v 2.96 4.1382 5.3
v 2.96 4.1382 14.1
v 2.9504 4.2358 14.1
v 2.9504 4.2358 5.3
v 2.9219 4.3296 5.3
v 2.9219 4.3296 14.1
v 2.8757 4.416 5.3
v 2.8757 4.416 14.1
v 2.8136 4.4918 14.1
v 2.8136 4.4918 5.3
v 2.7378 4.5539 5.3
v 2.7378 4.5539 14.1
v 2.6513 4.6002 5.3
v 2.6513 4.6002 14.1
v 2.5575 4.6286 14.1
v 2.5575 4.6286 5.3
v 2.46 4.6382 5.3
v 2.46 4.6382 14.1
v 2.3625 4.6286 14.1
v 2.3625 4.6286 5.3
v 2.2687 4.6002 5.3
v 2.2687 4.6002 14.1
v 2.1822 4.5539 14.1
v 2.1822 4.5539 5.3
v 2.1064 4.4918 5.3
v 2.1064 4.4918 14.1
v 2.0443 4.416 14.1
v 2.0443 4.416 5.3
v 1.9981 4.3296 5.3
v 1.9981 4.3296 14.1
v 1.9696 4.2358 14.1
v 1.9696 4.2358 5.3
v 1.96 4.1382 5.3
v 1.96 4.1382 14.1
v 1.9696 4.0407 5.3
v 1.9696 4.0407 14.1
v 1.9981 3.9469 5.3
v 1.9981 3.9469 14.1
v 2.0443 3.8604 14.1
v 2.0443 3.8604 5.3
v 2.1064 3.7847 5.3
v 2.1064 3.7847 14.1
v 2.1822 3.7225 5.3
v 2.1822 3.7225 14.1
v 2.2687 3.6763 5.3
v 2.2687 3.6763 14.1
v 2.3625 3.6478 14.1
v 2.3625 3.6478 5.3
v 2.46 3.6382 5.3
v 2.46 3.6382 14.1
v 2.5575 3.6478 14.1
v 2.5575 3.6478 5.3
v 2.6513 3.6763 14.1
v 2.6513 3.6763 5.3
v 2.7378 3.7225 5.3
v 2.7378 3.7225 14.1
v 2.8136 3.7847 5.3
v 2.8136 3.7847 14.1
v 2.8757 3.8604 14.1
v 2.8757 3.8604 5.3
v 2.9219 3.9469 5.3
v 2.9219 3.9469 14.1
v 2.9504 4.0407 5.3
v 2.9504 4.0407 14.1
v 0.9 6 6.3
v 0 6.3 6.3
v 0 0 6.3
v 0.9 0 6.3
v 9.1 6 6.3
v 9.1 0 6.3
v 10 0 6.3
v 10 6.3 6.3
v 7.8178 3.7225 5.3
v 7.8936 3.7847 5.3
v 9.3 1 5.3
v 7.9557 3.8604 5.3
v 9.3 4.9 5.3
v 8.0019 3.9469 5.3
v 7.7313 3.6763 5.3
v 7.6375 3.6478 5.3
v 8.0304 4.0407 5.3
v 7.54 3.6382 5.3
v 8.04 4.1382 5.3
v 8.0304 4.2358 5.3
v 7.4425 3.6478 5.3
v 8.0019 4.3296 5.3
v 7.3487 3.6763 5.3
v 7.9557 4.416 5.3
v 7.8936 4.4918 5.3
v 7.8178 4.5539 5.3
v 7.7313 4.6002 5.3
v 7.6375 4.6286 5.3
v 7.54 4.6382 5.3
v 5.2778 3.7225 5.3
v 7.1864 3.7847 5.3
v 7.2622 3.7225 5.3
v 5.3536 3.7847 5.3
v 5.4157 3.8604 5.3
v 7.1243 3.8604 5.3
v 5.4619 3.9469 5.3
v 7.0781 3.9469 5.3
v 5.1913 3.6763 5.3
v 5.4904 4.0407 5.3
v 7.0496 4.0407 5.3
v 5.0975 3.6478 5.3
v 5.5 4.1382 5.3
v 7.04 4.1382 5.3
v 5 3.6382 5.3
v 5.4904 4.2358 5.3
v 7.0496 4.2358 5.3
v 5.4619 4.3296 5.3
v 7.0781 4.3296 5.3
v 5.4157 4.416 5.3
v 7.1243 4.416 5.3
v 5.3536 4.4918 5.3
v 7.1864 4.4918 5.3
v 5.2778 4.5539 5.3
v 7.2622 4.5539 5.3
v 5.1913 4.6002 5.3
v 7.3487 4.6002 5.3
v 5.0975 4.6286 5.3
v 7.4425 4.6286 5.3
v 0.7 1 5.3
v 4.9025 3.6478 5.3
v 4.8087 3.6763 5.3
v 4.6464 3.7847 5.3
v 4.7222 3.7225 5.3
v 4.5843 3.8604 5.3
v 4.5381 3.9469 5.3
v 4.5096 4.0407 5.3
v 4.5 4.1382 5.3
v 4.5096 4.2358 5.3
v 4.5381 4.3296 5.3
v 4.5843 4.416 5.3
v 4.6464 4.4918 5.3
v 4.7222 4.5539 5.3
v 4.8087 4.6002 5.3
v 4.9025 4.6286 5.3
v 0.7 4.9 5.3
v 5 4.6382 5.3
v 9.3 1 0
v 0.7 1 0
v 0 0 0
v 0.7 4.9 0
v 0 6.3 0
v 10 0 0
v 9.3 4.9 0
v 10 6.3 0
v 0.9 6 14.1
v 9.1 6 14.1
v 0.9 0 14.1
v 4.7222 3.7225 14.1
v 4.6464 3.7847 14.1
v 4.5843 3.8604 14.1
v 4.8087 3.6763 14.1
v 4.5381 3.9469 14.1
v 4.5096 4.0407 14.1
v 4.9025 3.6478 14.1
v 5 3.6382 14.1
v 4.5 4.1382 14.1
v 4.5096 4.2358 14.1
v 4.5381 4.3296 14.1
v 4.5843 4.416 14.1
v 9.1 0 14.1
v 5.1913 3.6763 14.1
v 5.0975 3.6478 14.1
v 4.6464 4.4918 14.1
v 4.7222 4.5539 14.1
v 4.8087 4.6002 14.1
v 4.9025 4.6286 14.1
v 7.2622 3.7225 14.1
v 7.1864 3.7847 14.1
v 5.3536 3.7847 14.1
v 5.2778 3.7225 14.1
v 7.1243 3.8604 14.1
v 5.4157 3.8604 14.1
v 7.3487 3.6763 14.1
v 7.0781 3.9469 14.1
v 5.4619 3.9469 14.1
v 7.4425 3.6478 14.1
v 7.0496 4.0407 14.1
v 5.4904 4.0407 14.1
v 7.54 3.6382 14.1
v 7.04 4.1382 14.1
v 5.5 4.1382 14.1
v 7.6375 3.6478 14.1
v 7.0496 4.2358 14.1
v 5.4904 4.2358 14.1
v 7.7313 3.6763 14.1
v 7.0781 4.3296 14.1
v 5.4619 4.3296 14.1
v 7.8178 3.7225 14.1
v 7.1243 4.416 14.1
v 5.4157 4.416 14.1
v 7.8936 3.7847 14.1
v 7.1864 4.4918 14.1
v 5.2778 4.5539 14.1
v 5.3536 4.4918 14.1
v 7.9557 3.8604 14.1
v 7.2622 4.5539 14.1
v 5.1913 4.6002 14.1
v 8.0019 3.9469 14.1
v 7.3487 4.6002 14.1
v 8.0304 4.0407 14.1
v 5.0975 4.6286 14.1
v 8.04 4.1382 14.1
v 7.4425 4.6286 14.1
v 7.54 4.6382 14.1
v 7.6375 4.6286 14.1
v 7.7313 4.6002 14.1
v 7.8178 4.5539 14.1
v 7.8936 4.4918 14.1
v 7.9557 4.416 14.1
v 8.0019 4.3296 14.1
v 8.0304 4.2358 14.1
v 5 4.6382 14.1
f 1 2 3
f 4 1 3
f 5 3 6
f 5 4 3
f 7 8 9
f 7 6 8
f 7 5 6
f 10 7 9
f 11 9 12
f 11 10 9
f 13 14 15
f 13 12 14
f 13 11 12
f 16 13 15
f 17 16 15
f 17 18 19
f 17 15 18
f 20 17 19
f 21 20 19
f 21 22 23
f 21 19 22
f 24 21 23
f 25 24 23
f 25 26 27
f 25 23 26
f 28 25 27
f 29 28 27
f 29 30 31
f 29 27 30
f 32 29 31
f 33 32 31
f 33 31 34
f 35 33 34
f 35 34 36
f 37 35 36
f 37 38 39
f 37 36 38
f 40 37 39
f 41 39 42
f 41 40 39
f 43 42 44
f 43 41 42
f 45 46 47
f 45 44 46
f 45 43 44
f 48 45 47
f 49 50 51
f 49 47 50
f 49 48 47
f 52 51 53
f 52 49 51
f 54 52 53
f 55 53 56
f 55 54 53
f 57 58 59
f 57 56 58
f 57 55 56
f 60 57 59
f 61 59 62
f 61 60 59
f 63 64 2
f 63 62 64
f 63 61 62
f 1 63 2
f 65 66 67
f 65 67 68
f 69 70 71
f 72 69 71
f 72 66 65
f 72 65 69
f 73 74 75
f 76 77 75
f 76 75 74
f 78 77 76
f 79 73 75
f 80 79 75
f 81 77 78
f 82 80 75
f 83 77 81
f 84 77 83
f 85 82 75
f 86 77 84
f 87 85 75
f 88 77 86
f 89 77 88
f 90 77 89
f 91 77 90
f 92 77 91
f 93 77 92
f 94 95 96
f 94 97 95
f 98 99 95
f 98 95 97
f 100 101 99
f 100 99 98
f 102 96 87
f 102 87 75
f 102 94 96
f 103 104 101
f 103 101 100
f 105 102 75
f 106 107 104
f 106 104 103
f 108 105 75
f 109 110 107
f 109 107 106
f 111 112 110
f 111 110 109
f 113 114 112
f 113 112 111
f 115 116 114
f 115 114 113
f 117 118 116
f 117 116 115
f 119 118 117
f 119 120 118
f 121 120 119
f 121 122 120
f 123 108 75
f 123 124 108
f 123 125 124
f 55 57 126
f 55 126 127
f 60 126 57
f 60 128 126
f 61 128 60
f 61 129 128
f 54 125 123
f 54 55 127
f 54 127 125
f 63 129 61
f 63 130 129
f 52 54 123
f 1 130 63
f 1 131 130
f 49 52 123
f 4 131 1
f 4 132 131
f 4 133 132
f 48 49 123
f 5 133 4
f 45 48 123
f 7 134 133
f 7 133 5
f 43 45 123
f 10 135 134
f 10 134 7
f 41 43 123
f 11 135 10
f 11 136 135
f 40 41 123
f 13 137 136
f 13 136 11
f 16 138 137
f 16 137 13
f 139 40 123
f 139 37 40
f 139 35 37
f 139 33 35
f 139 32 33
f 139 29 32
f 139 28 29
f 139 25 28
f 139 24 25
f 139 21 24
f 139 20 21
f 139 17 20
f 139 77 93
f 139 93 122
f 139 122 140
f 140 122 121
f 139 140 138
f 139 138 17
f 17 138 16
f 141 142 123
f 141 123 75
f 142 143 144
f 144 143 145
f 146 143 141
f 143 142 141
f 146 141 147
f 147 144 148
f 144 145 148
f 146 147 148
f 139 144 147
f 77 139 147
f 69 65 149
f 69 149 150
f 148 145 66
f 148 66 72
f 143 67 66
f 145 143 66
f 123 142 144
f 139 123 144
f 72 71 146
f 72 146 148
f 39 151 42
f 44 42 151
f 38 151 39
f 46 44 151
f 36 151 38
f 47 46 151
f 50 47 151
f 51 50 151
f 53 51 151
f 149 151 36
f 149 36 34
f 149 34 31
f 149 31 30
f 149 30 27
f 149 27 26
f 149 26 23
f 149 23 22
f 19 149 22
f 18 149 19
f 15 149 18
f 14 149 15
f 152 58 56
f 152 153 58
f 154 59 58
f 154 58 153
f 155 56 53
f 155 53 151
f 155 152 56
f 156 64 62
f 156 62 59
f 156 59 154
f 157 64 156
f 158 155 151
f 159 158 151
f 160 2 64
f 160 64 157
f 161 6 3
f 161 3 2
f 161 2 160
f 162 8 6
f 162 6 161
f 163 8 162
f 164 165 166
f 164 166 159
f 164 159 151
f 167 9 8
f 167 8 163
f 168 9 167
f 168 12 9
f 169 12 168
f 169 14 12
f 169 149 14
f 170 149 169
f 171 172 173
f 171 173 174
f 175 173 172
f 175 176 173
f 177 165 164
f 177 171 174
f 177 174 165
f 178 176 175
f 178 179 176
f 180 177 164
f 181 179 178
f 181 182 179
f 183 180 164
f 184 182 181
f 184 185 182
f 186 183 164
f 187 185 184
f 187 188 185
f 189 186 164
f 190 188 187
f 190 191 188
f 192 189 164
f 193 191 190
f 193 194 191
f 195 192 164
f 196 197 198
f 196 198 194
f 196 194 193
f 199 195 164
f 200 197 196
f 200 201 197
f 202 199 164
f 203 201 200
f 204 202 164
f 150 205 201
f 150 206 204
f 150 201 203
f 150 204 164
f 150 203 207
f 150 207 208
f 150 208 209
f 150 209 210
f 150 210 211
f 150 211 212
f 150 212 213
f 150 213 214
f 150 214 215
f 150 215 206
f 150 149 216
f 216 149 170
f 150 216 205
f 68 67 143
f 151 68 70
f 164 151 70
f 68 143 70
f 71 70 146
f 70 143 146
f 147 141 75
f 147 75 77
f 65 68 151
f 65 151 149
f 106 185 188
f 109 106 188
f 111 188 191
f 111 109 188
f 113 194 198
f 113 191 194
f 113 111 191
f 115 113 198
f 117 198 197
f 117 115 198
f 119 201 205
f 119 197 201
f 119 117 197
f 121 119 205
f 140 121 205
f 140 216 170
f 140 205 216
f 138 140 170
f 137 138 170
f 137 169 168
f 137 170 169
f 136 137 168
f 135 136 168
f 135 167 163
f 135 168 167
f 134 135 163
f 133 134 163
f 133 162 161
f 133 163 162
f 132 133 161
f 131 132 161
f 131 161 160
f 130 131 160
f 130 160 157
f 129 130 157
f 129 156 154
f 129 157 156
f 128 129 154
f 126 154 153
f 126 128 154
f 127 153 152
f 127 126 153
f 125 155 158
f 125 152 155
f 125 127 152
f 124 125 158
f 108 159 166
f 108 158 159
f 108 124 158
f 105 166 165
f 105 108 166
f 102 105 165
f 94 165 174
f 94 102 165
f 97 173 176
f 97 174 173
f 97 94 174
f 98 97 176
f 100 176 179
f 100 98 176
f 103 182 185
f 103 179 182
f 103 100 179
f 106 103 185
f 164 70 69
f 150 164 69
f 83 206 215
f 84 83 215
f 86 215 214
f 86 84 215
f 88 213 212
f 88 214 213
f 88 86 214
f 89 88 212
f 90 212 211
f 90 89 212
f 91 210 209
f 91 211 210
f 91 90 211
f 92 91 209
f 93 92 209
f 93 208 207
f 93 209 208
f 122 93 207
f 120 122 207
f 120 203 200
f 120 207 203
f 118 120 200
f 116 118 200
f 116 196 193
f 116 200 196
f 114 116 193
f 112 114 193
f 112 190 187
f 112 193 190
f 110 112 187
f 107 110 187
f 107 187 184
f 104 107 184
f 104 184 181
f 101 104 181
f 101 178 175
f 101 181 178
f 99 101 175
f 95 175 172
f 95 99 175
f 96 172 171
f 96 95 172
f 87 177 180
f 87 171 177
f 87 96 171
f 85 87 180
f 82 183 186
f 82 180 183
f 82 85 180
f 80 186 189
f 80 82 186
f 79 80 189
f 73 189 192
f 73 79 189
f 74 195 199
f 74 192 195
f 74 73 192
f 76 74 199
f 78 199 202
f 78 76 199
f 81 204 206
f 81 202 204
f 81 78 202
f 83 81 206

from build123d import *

# Parameters (mm, degrees)
SKETCH_1_W               = 10
SKETCH_1_H               = 6.3
SKETCH_1_W_2             = 8.6
SKETCH_1_H_2             = 3.9
EXTRUDE_1_DEPTH          = 6.3
SKETCH_2_W               = 8.2
SKETCH_2_H               = 6
EXTRUDE_2_DEPTH          = 7.8
SKETCH_3_W               = 10
SKETCH_3_H               = 6.3
EXTRUDE_3_DEPTH          = 1
CUT_EXTRUDE_1_DEPTH      = 19.398369493
CUT_EXTRUDE_1_DEPTH_BACK = 19.398369493
SKETCH_4_R               = 0.5


with BuildPart() as part:
    # 草图1 → 凸台-拉伸1 (new body)
    with BuildSketch(Plane.XY):
        with Locations((5, 3.15)):
            Rectangle(SKETCH_1_W, SKETCH_1_H)
        with Locations((5, 2.95)):
            Rectangle(SKETCH_1_W_2, SKETCH_1_H_2, mode=Mode.SUBTRACT)
    extrude(amount=EXTRUDE_1_DEPTH)

    # 草图2 → 凸台-拉伸2 (add)
    with BuildSketch(Plane.XY.offset(6.3)):
        with Locations((5, 3)):
            Rectangle(SKETCH_2_W, SKETCH_2_H)
    extrude(amount=EXTRUDE_2_DEPTH)

    # 草图3 → 凸台-拉伸3 (add)
    with BuildSketch(Plane(origin=(0, 0, 6.3), x_dir=(-1, 0, 0), z_dir=(0, 0, -1))):
        with Locations((-5, 3.15)):
            Rectangle(SKETCH_3_W, SKETCH_3_H)
    extrude(amount=EXTRUDE_3_DEPTH)

    # 草图4 → 切除-拉伸1 (cut, two sides: drawn at the far end of the back side and taken through both)
    with BuildSketch(Plane.XY.offset(14.1).offset(-CUT_EXTRUDE_1_DEPTH_BACK)):
        with Locations((2.46, 4.138210579)):
            Circle(SKETCH_4_R)
        with Locations((5, 4.138210579)):
            Circle(SKETCH_4_R)
        with Locations((7.54, 4.138210579)):
            Circle(SKETCH_4_R)
    extrude(amount=CUT_EXTRUDE_1_DEPTH + CUT_EXTRUDE_1_DEPTH_BACK, mode=Mode.SUBTRACT)


solid = part.part
